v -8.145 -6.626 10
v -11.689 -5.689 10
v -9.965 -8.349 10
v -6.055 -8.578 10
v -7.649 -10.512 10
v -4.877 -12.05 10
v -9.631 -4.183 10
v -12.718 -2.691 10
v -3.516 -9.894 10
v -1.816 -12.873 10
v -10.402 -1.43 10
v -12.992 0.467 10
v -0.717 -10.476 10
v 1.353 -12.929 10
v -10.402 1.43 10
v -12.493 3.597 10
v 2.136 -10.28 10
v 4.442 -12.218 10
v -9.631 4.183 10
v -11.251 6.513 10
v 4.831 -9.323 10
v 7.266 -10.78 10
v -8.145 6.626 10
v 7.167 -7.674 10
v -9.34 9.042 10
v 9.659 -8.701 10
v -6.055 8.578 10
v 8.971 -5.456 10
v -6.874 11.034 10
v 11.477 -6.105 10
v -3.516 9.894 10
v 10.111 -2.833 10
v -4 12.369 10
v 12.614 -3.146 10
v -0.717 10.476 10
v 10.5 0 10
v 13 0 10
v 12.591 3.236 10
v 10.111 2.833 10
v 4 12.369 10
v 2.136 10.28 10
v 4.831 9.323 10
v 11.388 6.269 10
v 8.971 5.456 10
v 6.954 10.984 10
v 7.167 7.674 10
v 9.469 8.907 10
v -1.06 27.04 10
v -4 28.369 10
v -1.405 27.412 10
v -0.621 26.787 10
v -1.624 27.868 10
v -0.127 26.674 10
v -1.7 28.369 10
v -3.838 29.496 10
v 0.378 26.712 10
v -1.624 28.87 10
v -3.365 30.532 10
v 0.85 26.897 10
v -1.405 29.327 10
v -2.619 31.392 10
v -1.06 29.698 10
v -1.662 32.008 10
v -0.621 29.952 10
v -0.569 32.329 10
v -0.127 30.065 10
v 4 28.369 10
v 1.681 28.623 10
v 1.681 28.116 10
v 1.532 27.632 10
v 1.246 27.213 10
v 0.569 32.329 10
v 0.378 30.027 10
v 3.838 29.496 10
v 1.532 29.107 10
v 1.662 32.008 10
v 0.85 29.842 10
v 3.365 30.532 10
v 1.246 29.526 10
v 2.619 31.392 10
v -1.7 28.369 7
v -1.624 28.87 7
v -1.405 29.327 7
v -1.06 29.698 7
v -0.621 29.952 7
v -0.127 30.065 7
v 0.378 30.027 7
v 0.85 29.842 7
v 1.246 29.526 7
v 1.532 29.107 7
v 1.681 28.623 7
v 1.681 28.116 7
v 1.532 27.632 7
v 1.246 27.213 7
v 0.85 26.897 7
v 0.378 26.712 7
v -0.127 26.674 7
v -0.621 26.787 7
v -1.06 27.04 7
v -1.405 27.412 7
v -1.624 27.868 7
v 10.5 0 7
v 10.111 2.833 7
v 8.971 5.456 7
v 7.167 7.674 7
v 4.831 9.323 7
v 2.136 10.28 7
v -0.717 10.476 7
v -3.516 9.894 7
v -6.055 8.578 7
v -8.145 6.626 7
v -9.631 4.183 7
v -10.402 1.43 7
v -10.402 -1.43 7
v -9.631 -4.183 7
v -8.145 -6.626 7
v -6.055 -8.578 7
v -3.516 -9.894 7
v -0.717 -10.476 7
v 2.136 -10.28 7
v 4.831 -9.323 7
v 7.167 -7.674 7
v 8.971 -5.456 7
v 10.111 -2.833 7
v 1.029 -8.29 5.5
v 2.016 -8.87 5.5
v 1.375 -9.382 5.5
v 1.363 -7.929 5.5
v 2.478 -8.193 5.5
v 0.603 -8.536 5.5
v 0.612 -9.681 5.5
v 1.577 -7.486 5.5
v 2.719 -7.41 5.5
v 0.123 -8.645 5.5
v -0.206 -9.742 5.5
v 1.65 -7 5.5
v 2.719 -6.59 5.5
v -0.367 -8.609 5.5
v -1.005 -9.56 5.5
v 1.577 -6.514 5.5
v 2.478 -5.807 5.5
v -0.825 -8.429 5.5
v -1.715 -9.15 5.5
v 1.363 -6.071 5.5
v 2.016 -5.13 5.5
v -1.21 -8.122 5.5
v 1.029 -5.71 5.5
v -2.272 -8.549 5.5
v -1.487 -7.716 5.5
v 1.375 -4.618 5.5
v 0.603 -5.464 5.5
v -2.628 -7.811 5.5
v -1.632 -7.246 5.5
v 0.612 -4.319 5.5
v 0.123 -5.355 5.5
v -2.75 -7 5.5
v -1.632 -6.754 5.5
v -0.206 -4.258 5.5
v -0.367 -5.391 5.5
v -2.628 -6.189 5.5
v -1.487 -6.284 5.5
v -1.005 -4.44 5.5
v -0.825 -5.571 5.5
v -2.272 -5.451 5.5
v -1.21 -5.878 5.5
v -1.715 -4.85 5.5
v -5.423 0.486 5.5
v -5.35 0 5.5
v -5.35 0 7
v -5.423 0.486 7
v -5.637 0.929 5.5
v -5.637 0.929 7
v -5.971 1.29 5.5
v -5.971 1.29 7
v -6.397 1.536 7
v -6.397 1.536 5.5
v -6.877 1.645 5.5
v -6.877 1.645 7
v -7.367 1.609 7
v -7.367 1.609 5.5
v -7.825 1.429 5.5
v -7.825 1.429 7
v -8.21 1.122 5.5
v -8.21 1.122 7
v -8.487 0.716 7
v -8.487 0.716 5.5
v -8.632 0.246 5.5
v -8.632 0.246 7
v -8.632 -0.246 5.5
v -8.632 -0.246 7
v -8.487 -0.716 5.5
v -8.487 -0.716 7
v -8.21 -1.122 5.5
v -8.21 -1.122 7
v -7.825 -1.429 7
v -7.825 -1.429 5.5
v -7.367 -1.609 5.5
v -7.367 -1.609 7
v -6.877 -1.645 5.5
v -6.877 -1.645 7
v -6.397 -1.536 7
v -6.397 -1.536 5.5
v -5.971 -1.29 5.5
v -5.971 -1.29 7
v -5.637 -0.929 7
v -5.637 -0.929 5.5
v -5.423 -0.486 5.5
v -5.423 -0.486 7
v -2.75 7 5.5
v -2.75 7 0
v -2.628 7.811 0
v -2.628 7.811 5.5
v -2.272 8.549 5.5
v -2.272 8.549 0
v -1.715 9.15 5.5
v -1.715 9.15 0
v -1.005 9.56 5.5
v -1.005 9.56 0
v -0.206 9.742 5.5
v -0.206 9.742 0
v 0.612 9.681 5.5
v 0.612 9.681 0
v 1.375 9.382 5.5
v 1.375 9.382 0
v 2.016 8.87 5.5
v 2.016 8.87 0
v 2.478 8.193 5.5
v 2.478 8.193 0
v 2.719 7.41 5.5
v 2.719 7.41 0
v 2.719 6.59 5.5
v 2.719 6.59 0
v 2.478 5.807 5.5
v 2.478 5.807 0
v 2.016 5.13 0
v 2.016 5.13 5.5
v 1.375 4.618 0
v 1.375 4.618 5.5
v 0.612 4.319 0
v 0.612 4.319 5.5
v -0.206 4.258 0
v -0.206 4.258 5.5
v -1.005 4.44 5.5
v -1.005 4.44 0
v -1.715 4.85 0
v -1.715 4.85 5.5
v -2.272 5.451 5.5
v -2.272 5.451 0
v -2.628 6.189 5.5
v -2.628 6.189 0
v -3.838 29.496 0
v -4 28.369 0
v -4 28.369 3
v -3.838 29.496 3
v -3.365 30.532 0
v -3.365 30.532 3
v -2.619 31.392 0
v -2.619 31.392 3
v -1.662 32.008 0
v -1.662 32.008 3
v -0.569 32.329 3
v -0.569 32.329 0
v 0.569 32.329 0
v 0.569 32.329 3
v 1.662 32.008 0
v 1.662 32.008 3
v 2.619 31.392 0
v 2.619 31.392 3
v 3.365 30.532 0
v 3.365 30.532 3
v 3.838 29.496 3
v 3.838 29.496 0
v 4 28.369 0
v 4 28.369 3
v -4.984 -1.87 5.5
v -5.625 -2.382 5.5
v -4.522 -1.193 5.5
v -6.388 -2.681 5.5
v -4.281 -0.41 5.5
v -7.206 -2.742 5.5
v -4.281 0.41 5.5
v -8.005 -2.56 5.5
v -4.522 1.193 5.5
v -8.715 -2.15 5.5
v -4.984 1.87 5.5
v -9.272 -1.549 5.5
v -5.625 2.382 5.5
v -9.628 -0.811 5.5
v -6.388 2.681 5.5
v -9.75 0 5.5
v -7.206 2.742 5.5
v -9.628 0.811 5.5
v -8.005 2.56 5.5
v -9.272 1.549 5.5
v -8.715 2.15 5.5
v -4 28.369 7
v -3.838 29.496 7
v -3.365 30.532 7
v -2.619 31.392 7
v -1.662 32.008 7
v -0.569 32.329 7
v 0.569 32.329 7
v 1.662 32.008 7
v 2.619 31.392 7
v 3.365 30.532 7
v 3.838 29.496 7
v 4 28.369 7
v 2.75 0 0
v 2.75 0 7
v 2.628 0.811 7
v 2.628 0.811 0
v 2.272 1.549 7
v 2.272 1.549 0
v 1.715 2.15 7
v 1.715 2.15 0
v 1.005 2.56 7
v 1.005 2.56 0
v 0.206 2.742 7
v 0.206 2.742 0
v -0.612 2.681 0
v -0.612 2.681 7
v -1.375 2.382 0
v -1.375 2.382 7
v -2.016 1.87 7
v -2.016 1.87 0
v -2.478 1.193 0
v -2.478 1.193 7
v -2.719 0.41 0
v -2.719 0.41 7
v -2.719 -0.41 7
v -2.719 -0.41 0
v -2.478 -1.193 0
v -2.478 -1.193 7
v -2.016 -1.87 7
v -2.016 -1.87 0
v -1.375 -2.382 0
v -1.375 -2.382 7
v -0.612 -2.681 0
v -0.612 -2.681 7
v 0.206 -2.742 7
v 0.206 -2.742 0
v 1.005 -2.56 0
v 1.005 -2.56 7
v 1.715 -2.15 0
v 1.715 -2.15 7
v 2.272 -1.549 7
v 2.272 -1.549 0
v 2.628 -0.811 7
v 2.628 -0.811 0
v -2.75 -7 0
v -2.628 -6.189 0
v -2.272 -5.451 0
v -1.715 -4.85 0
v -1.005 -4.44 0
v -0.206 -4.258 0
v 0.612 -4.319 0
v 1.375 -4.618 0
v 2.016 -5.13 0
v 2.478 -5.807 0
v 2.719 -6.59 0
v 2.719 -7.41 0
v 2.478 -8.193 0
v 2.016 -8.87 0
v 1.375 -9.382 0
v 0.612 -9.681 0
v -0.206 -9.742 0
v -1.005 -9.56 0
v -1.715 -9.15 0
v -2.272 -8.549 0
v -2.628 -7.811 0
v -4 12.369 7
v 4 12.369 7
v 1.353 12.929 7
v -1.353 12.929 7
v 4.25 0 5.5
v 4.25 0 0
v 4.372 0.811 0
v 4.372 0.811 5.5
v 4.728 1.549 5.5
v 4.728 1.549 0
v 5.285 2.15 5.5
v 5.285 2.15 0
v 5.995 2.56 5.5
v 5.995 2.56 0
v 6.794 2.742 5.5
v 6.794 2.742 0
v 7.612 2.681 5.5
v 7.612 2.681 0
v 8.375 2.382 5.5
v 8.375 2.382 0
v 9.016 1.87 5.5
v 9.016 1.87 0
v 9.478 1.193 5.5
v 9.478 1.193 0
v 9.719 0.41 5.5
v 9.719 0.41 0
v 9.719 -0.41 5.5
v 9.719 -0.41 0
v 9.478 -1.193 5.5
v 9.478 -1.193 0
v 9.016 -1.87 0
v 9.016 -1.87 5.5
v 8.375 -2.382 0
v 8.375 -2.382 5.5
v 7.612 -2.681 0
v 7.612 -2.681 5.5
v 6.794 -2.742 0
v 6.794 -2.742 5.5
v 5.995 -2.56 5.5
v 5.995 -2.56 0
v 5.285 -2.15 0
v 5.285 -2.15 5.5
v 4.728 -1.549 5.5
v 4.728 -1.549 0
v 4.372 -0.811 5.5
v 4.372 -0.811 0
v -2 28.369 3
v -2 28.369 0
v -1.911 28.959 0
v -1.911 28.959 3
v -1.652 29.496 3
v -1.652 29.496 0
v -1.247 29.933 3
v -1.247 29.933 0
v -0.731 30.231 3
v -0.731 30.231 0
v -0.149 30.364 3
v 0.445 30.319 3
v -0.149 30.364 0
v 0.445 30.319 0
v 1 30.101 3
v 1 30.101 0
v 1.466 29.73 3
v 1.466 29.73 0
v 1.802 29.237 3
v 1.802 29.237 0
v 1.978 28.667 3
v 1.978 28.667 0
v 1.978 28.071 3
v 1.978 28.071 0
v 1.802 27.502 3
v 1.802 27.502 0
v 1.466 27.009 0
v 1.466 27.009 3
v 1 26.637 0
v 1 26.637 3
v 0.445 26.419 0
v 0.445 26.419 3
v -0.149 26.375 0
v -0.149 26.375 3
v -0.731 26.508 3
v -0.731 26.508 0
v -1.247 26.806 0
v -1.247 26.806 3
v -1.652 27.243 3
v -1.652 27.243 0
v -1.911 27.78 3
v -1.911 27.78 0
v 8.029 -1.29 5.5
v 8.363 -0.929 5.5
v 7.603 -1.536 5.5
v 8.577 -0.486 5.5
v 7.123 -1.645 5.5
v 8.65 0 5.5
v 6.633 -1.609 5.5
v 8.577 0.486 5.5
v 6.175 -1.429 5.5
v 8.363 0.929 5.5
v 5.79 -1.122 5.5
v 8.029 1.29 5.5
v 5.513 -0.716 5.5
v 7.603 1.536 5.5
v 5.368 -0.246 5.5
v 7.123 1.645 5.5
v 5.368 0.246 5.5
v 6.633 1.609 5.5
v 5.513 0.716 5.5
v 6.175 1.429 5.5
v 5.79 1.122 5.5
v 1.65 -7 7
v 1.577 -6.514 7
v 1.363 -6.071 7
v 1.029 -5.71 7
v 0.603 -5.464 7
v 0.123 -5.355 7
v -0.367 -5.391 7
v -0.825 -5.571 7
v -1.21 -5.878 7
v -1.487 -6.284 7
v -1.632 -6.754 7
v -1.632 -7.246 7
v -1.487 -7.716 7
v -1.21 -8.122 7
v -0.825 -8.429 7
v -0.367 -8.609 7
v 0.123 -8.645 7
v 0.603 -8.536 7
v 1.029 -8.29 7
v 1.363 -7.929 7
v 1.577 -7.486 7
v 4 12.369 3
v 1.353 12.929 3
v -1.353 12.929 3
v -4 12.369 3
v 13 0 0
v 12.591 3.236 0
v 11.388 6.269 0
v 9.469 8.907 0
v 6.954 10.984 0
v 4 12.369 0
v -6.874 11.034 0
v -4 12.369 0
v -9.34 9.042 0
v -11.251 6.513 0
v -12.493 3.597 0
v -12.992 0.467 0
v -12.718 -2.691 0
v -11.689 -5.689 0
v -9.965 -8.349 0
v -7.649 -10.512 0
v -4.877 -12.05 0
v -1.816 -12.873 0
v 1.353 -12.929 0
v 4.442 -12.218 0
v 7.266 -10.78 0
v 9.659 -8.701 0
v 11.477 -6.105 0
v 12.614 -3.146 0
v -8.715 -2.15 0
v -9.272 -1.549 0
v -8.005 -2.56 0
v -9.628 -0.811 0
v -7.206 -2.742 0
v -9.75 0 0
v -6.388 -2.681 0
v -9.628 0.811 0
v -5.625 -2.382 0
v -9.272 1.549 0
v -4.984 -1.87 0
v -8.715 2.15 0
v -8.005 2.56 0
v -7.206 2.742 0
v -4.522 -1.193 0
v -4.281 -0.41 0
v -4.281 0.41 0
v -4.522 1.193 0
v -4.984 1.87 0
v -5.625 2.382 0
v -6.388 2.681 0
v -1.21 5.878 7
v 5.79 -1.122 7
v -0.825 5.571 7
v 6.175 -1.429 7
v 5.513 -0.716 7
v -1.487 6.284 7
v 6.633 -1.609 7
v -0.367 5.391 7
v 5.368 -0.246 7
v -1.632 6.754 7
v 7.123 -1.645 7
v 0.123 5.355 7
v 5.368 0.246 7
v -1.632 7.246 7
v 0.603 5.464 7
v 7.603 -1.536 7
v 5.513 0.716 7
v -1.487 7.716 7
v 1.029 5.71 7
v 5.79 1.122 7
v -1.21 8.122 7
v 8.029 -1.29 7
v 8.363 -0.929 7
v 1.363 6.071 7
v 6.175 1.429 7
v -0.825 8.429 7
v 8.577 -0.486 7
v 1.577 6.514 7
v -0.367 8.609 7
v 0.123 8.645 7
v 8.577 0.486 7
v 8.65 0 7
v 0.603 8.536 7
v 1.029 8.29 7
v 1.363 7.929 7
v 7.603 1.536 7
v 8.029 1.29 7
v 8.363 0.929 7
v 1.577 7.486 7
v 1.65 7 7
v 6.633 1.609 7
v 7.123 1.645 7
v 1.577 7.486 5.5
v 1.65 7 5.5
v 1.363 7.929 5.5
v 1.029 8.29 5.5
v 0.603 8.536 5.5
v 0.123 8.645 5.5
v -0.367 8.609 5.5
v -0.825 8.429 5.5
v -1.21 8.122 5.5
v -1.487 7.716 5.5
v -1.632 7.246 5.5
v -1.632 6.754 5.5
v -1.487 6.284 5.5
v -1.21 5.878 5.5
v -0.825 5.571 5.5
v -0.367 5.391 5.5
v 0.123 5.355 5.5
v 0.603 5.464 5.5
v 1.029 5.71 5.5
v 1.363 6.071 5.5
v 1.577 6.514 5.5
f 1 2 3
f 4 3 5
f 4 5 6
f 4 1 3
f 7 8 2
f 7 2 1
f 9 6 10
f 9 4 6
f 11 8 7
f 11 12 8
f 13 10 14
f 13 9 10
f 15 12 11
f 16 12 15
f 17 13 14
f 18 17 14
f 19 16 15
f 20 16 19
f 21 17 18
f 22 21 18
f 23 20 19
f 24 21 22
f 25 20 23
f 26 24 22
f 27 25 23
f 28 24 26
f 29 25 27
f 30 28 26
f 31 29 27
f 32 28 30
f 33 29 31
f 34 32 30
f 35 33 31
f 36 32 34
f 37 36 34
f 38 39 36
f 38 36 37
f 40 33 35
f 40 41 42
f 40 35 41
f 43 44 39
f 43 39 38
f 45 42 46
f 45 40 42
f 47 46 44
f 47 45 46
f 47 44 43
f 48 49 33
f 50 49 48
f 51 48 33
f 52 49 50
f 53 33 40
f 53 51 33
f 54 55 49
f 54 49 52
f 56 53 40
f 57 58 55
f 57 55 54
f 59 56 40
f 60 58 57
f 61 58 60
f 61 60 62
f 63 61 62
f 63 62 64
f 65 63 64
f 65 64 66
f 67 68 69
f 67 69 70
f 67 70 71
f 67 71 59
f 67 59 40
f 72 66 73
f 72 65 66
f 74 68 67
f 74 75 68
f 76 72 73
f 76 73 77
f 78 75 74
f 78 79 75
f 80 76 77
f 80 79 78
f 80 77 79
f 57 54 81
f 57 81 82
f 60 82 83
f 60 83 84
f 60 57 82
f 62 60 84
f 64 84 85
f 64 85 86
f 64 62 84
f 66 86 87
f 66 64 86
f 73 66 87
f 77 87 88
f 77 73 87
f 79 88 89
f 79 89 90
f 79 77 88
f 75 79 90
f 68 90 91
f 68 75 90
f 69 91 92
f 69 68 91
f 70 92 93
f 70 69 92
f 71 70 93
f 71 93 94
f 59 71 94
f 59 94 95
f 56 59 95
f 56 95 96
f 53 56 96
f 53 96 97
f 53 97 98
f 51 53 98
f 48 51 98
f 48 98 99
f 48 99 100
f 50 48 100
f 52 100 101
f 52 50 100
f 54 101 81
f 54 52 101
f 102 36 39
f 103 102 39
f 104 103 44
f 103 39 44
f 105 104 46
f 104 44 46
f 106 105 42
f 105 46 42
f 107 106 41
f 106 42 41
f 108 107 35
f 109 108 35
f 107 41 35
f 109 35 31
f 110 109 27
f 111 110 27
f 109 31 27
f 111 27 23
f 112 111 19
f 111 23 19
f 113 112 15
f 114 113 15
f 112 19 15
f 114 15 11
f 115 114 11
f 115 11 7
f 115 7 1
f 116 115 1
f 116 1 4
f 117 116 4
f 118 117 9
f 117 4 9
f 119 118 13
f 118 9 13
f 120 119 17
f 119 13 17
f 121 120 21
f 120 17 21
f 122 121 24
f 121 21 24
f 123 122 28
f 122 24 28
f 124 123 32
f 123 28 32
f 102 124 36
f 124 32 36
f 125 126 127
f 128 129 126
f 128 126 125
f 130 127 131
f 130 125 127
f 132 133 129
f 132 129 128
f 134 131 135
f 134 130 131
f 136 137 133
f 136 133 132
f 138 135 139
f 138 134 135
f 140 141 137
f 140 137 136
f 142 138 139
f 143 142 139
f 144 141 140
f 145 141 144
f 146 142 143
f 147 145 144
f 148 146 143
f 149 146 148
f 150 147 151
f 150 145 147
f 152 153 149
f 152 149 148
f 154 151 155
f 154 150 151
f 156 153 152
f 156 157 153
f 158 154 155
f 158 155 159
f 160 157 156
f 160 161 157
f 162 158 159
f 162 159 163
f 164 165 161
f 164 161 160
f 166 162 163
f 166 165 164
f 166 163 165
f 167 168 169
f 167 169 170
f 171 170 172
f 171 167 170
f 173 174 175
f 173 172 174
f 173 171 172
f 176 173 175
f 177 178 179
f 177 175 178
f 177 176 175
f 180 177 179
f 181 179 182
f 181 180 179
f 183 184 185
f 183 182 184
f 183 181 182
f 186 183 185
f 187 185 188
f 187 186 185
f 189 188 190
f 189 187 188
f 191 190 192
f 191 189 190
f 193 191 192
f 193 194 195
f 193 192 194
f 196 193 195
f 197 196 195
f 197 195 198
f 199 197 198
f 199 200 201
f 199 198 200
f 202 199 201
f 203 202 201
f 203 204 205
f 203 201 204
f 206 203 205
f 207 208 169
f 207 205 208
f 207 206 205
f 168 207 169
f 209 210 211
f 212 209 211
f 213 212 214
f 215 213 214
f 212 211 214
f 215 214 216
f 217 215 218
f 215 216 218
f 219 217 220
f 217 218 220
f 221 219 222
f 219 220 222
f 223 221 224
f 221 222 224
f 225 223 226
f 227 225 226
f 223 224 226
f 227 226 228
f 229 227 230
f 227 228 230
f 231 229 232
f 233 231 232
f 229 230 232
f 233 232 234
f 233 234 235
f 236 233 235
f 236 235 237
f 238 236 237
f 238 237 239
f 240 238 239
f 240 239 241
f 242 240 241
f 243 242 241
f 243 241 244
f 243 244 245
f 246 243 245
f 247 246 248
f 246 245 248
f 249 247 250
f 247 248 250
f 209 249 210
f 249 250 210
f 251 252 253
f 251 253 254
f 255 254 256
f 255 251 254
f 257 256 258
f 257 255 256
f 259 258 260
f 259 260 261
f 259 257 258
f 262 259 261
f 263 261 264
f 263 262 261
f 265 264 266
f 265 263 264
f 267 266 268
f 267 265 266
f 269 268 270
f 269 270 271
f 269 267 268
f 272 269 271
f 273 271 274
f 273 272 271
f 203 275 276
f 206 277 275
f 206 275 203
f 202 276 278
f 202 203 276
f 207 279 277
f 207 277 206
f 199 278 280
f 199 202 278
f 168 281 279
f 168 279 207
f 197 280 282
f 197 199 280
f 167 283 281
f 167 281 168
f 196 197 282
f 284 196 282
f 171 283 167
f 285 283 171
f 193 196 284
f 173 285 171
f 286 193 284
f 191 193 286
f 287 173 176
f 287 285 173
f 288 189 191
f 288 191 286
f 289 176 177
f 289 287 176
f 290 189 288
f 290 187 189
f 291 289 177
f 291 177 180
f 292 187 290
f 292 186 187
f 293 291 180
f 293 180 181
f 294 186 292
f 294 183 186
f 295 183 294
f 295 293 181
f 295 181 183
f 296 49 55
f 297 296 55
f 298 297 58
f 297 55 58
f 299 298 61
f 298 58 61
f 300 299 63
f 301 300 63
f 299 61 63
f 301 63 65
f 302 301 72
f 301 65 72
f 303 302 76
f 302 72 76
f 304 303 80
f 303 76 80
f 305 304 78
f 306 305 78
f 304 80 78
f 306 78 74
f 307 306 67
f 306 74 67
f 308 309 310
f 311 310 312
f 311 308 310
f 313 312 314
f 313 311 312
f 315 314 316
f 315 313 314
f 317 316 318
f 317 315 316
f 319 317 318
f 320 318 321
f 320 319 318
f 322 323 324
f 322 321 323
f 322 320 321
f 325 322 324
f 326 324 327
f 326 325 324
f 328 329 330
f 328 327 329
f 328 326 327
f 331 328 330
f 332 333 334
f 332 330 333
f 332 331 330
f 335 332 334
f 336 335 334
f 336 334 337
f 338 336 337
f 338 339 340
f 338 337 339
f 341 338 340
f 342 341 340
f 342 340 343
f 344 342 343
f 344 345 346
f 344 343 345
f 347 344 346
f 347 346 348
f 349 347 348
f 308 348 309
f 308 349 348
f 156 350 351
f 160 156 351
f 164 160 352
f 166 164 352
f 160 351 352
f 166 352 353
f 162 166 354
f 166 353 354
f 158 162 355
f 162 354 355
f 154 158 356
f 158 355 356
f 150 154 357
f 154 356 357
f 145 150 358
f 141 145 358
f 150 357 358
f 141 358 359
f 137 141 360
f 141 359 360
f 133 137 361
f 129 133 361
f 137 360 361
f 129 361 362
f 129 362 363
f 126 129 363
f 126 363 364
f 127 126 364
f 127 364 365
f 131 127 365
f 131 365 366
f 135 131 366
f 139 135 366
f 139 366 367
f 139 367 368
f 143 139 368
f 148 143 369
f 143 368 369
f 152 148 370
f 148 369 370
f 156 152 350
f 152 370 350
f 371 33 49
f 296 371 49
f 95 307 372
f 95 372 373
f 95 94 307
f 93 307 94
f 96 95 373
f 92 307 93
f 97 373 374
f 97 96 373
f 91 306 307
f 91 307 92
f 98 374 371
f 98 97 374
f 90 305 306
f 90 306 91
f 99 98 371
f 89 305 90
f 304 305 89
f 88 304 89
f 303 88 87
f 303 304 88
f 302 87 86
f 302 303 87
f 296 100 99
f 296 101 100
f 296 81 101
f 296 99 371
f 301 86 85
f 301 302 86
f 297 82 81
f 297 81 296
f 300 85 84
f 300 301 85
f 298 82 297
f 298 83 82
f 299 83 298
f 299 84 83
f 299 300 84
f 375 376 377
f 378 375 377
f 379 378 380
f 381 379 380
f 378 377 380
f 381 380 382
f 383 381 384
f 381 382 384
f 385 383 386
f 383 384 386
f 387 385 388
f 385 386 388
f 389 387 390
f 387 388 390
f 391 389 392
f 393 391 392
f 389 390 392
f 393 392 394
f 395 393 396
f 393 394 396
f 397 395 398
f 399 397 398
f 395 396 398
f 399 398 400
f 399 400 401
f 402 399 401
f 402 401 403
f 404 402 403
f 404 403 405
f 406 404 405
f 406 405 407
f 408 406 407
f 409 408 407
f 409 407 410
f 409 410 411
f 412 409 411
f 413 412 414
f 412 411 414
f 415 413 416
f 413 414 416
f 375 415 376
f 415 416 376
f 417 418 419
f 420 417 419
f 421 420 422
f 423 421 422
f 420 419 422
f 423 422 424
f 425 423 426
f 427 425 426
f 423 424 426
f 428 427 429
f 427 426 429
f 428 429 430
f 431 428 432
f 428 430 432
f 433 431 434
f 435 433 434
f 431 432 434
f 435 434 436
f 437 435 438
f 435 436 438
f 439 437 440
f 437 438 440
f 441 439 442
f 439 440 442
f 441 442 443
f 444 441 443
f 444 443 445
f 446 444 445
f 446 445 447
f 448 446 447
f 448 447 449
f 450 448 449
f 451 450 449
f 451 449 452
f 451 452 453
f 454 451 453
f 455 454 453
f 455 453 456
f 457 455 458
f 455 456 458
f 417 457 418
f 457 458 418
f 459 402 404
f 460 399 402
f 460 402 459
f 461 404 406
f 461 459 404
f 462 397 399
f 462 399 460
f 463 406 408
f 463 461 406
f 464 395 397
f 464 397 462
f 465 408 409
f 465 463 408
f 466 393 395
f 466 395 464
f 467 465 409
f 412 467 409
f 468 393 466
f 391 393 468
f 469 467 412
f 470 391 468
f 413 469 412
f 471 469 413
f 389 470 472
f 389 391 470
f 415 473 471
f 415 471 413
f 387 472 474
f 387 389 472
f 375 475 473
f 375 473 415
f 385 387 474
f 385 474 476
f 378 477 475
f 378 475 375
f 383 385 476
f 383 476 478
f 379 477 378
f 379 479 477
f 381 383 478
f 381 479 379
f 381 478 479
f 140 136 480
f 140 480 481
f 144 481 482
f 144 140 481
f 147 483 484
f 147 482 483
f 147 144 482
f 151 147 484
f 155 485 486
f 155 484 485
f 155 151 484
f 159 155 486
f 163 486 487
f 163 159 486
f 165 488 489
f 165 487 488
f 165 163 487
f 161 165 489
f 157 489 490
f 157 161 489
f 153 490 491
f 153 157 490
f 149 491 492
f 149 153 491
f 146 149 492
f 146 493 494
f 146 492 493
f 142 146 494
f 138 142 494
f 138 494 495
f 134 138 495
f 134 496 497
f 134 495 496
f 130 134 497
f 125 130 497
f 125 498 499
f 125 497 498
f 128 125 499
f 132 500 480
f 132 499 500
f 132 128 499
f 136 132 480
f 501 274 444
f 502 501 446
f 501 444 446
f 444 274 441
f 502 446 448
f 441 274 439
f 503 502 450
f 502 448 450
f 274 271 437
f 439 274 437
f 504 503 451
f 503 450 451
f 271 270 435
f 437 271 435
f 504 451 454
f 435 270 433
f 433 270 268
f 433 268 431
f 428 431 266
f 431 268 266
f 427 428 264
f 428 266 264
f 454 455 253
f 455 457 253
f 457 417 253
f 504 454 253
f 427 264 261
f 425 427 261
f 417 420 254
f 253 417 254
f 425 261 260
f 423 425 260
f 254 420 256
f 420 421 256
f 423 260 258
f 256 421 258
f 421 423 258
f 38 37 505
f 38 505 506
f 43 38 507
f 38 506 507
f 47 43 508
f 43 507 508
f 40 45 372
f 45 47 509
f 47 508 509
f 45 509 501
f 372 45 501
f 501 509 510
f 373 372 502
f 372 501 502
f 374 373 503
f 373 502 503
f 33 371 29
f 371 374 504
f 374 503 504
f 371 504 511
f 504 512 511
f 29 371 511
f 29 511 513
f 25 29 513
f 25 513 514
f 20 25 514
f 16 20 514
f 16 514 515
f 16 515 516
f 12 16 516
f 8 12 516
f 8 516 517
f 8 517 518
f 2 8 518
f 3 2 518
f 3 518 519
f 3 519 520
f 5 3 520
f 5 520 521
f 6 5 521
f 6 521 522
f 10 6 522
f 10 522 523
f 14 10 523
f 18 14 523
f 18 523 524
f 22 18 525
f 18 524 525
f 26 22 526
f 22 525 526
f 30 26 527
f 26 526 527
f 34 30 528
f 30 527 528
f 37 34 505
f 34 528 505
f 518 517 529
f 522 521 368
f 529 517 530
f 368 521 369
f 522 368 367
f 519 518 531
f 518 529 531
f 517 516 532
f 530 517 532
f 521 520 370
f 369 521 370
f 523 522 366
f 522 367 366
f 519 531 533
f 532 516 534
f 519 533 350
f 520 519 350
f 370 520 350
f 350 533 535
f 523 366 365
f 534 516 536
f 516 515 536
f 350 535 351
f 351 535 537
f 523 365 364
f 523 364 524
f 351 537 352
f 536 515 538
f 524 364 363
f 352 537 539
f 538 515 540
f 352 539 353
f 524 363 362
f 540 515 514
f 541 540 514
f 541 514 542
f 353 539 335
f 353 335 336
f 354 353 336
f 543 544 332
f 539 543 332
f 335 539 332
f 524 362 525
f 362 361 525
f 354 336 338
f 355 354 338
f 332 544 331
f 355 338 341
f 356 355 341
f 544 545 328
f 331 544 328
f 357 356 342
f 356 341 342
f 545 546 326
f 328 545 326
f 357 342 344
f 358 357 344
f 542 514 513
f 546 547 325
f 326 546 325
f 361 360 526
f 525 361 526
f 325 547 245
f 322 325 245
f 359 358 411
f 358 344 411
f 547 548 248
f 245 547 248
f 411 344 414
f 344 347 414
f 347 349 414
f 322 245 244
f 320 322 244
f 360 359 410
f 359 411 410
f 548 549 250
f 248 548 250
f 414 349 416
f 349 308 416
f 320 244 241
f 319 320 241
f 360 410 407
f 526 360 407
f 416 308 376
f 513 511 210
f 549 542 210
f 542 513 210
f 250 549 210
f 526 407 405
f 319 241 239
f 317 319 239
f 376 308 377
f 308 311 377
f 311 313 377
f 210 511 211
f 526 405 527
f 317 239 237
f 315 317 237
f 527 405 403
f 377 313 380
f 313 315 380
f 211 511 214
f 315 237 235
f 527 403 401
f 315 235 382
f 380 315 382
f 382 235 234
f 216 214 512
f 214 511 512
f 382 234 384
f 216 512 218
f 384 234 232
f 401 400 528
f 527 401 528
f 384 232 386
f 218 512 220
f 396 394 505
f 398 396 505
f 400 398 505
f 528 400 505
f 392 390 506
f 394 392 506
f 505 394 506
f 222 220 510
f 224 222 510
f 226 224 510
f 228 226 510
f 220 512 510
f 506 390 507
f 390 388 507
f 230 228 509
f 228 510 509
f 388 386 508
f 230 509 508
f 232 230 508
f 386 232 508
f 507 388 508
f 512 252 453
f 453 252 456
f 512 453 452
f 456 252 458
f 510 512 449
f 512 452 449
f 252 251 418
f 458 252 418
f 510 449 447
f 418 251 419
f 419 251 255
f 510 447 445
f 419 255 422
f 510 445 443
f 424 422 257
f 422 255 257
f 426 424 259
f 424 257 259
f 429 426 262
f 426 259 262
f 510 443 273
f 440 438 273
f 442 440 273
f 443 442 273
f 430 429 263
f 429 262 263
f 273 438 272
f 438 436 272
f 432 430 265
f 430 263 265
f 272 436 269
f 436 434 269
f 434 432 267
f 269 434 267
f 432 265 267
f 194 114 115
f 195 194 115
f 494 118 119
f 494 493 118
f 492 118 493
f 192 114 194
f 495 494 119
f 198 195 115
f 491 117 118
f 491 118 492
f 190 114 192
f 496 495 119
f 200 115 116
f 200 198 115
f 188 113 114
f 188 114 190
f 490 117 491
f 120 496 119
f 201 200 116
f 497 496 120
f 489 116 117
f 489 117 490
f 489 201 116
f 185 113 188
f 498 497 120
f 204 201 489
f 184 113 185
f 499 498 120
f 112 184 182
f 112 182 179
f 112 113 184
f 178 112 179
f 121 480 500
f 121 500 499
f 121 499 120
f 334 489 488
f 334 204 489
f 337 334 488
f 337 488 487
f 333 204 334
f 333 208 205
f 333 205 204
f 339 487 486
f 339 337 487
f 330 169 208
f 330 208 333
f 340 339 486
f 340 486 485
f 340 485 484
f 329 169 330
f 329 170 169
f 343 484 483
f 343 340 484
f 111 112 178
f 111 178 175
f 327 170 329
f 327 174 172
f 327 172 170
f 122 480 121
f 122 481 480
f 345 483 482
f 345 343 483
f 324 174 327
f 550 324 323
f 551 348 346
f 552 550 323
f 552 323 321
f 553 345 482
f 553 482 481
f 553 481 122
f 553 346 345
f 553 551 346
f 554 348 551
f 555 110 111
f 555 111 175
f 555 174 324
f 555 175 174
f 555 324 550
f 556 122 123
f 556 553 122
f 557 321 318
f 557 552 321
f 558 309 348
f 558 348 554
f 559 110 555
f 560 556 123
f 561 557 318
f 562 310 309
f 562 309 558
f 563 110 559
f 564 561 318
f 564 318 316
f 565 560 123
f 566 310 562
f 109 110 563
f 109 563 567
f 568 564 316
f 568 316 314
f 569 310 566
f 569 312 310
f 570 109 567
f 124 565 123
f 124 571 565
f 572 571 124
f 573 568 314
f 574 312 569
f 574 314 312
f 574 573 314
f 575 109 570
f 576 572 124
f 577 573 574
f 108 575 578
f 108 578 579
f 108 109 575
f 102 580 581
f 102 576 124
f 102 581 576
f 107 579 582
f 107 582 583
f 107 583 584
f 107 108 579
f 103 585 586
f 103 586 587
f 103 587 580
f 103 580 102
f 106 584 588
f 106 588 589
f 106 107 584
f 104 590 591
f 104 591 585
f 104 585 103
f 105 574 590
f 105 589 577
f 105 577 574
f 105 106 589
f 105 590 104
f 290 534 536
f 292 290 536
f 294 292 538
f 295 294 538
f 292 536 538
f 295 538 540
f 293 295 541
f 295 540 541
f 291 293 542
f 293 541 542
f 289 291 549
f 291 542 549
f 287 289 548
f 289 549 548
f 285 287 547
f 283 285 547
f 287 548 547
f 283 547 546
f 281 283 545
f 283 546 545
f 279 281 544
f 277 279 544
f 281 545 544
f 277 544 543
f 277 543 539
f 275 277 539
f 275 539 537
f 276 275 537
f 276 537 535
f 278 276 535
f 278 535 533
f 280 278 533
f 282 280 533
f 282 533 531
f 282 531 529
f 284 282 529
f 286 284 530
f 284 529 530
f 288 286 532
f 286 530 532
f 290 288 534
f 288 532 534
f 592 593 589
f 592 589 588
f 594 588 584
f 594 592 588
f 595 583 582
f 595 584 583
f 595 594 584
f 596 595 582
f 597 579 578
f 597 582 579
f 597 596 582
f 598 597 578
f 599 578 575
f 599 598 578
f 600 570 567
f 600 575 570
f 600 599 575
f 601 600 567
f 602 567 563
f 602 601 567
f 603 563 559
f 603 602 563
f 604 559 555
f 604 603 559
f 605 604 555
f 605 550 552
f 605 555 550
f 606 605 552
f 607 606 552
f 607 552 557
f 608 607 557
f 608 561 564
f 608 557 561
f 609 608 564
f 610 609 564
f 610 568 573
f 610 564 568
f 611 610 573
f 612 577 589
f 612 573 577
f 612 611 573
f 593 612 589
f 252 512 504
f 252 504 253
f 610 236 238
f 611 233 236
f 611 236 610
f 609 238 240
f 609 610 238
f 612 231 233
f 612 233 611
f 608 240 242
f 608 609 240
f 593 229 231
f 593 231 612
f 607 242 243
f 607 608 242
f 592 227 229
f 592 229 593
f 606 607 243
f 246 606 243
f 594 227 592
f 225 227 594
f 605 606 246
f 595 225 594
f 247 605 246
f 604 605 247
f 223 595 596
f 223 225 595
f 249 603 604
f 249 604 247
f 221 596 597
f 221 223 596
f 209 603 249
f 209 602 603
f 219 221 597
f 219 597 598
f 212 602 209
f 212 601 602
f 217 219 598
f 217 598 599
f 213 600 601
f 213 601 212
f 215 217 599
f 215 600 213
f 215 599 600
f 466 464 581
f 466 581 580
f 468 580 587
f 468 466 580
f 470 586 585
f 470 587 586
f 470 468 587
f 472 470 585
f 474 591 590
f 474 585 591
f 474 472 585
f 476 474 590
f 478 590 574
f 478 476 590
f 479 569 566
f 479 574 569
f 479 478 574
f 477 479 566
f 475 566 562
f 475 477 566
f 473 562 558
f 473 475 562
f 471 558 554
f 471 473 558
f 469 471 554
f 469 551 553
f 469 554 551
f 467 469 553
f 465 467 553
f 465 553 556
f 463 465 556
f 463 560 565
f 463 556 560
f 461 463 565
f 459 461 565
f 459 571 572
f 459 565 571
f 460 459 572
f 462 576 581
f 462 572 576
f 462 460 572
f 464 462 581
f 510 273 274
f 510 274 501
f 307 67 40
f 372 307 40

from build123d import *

# Parameters (mm, degrees)
ESQUISSE1_R             = 13
ESQUISSE1_R_2           = 2.75
ESQUISSE1_R_3           = 1.65
BOSS_EXTRU_1_DEPTH      = 10
ESQUISSE2_R             = 10.5
ENL_V_MAT_EXTRU_1_DEPTH = 3
ESQUISSE3_R             = 2.75
ENL_V_MAT_EXTRU_2_DEPTH = 5.5
ESQUISSE4_R             = 1.7
BOSS_EXTRU_2_DEPTH      = 3
ESQUISSE5_R             = 2
ENL_V_MAT_EXTRU_3_DEPTH = 3


with BuildPart() as part:
    # Esquisse1 → Boss.-Extru.1 (new body)
    with BuildSketch(Plane.XY):
        Circle(ESQUISSE1_R)
        Circle(ESQUISSE1_R_2, mode=Mode.SUBTRACT)
        with Locations((-7, 0)):
            Circle(ESQUISSE1_R_3, mode=Mode.SUBTRACT)
        with Locations((0, 7)):
            Circle(ESQUISSE1_R_3, mode=Mode.SUBTRACT)
        with Locations((7, 0)):
            Circle(ESQUISSE1_R_3, mode=Mode.SUBTRACT)
        with Locations((0, -7)):
            Circle(ESQUISSE1_R_3, mode=Mode.SUBTRACT)
    extrude(amount=BOSS_EXTRU_1_DEPTH)

    # Esquisse2 → Enlèv. mat.-Extru.1 (cut)
    with BuildSketch(Plane.XY.offset(10)):
        Circle(ESQUISSE2_R)
    extrude(amount=-ENL_V_MAT_EXTRU_1_DEPTH, mode=Mode.SUBTRACT)

    # Esquisse3 → Enlèv. mat.-Extru.2 (cut)
    with BuildSketch(Plane(origin=(0, 0, 0), x_dir=(-1, 0, 0), z_dir=(0, 0, -1))):
        with Locations((-7, 0)):
            Circle(ESQUISSE3_R)
        with Locations((0, 7)):
            Circle(ESQUISSE3_R)
        with Locations((7, 0)):
            Circle(ESQUISSE3_R)
        with Locations((0, -7)):
            Circle(ESQUISSE3_R)
    extrude(amount=-ENL_V_MAT_EXTRU_2_DEPTH, mode=Mode.SUBTRACT)

    # Esquisse4 → Boss.-Extru.2 (add)
    with BuildSketch(Plane(origin=(0, 0, 0), x_dir=(-1, 0, 0), z_dir=(0, 0, -1))):
        with BuildLine():
            Line((-4, 28.369316877), (-4, 12.369316877))
            ThreePointArc((-4, 12.369316877), (0, 13), (4, 12.369316877))
            Line((4, 12.369316877), (4, 28.369316877))
            ThreePointArc((4, 28.369316877), (0, 32.369316877), (-4, 28.369316877))
        make_face()
        with Locations((0, 28.369316877)):
            Circle(ESQUISSE4_R, mode=Mode.SUBTRACT)
    boss_extru_2 = extrude(amount=-BOSS_EXTRU_2_DEPTH)

    # Symétrie1: Boss.-Extru.2 across plane
    add(boss_extru_2.mirror(Plane.XY.offset(5)))

    # Esquisse5 → Enlèv. mat.-Extru.3 (cut)
    with BuildSketch(Plane(origin=(0, 0, 0), x_dir=(-1, 0, 0), z_dir=(0, 0, -1))):
        with Locations((0, 28.369316877)):
            Circle(ESQUISSE5_R)
    extrude(amount=-ENL_V_MAT_EXTRU_3_DEPTH, mode=Mode.SUBTRACT)


solid = part.part
